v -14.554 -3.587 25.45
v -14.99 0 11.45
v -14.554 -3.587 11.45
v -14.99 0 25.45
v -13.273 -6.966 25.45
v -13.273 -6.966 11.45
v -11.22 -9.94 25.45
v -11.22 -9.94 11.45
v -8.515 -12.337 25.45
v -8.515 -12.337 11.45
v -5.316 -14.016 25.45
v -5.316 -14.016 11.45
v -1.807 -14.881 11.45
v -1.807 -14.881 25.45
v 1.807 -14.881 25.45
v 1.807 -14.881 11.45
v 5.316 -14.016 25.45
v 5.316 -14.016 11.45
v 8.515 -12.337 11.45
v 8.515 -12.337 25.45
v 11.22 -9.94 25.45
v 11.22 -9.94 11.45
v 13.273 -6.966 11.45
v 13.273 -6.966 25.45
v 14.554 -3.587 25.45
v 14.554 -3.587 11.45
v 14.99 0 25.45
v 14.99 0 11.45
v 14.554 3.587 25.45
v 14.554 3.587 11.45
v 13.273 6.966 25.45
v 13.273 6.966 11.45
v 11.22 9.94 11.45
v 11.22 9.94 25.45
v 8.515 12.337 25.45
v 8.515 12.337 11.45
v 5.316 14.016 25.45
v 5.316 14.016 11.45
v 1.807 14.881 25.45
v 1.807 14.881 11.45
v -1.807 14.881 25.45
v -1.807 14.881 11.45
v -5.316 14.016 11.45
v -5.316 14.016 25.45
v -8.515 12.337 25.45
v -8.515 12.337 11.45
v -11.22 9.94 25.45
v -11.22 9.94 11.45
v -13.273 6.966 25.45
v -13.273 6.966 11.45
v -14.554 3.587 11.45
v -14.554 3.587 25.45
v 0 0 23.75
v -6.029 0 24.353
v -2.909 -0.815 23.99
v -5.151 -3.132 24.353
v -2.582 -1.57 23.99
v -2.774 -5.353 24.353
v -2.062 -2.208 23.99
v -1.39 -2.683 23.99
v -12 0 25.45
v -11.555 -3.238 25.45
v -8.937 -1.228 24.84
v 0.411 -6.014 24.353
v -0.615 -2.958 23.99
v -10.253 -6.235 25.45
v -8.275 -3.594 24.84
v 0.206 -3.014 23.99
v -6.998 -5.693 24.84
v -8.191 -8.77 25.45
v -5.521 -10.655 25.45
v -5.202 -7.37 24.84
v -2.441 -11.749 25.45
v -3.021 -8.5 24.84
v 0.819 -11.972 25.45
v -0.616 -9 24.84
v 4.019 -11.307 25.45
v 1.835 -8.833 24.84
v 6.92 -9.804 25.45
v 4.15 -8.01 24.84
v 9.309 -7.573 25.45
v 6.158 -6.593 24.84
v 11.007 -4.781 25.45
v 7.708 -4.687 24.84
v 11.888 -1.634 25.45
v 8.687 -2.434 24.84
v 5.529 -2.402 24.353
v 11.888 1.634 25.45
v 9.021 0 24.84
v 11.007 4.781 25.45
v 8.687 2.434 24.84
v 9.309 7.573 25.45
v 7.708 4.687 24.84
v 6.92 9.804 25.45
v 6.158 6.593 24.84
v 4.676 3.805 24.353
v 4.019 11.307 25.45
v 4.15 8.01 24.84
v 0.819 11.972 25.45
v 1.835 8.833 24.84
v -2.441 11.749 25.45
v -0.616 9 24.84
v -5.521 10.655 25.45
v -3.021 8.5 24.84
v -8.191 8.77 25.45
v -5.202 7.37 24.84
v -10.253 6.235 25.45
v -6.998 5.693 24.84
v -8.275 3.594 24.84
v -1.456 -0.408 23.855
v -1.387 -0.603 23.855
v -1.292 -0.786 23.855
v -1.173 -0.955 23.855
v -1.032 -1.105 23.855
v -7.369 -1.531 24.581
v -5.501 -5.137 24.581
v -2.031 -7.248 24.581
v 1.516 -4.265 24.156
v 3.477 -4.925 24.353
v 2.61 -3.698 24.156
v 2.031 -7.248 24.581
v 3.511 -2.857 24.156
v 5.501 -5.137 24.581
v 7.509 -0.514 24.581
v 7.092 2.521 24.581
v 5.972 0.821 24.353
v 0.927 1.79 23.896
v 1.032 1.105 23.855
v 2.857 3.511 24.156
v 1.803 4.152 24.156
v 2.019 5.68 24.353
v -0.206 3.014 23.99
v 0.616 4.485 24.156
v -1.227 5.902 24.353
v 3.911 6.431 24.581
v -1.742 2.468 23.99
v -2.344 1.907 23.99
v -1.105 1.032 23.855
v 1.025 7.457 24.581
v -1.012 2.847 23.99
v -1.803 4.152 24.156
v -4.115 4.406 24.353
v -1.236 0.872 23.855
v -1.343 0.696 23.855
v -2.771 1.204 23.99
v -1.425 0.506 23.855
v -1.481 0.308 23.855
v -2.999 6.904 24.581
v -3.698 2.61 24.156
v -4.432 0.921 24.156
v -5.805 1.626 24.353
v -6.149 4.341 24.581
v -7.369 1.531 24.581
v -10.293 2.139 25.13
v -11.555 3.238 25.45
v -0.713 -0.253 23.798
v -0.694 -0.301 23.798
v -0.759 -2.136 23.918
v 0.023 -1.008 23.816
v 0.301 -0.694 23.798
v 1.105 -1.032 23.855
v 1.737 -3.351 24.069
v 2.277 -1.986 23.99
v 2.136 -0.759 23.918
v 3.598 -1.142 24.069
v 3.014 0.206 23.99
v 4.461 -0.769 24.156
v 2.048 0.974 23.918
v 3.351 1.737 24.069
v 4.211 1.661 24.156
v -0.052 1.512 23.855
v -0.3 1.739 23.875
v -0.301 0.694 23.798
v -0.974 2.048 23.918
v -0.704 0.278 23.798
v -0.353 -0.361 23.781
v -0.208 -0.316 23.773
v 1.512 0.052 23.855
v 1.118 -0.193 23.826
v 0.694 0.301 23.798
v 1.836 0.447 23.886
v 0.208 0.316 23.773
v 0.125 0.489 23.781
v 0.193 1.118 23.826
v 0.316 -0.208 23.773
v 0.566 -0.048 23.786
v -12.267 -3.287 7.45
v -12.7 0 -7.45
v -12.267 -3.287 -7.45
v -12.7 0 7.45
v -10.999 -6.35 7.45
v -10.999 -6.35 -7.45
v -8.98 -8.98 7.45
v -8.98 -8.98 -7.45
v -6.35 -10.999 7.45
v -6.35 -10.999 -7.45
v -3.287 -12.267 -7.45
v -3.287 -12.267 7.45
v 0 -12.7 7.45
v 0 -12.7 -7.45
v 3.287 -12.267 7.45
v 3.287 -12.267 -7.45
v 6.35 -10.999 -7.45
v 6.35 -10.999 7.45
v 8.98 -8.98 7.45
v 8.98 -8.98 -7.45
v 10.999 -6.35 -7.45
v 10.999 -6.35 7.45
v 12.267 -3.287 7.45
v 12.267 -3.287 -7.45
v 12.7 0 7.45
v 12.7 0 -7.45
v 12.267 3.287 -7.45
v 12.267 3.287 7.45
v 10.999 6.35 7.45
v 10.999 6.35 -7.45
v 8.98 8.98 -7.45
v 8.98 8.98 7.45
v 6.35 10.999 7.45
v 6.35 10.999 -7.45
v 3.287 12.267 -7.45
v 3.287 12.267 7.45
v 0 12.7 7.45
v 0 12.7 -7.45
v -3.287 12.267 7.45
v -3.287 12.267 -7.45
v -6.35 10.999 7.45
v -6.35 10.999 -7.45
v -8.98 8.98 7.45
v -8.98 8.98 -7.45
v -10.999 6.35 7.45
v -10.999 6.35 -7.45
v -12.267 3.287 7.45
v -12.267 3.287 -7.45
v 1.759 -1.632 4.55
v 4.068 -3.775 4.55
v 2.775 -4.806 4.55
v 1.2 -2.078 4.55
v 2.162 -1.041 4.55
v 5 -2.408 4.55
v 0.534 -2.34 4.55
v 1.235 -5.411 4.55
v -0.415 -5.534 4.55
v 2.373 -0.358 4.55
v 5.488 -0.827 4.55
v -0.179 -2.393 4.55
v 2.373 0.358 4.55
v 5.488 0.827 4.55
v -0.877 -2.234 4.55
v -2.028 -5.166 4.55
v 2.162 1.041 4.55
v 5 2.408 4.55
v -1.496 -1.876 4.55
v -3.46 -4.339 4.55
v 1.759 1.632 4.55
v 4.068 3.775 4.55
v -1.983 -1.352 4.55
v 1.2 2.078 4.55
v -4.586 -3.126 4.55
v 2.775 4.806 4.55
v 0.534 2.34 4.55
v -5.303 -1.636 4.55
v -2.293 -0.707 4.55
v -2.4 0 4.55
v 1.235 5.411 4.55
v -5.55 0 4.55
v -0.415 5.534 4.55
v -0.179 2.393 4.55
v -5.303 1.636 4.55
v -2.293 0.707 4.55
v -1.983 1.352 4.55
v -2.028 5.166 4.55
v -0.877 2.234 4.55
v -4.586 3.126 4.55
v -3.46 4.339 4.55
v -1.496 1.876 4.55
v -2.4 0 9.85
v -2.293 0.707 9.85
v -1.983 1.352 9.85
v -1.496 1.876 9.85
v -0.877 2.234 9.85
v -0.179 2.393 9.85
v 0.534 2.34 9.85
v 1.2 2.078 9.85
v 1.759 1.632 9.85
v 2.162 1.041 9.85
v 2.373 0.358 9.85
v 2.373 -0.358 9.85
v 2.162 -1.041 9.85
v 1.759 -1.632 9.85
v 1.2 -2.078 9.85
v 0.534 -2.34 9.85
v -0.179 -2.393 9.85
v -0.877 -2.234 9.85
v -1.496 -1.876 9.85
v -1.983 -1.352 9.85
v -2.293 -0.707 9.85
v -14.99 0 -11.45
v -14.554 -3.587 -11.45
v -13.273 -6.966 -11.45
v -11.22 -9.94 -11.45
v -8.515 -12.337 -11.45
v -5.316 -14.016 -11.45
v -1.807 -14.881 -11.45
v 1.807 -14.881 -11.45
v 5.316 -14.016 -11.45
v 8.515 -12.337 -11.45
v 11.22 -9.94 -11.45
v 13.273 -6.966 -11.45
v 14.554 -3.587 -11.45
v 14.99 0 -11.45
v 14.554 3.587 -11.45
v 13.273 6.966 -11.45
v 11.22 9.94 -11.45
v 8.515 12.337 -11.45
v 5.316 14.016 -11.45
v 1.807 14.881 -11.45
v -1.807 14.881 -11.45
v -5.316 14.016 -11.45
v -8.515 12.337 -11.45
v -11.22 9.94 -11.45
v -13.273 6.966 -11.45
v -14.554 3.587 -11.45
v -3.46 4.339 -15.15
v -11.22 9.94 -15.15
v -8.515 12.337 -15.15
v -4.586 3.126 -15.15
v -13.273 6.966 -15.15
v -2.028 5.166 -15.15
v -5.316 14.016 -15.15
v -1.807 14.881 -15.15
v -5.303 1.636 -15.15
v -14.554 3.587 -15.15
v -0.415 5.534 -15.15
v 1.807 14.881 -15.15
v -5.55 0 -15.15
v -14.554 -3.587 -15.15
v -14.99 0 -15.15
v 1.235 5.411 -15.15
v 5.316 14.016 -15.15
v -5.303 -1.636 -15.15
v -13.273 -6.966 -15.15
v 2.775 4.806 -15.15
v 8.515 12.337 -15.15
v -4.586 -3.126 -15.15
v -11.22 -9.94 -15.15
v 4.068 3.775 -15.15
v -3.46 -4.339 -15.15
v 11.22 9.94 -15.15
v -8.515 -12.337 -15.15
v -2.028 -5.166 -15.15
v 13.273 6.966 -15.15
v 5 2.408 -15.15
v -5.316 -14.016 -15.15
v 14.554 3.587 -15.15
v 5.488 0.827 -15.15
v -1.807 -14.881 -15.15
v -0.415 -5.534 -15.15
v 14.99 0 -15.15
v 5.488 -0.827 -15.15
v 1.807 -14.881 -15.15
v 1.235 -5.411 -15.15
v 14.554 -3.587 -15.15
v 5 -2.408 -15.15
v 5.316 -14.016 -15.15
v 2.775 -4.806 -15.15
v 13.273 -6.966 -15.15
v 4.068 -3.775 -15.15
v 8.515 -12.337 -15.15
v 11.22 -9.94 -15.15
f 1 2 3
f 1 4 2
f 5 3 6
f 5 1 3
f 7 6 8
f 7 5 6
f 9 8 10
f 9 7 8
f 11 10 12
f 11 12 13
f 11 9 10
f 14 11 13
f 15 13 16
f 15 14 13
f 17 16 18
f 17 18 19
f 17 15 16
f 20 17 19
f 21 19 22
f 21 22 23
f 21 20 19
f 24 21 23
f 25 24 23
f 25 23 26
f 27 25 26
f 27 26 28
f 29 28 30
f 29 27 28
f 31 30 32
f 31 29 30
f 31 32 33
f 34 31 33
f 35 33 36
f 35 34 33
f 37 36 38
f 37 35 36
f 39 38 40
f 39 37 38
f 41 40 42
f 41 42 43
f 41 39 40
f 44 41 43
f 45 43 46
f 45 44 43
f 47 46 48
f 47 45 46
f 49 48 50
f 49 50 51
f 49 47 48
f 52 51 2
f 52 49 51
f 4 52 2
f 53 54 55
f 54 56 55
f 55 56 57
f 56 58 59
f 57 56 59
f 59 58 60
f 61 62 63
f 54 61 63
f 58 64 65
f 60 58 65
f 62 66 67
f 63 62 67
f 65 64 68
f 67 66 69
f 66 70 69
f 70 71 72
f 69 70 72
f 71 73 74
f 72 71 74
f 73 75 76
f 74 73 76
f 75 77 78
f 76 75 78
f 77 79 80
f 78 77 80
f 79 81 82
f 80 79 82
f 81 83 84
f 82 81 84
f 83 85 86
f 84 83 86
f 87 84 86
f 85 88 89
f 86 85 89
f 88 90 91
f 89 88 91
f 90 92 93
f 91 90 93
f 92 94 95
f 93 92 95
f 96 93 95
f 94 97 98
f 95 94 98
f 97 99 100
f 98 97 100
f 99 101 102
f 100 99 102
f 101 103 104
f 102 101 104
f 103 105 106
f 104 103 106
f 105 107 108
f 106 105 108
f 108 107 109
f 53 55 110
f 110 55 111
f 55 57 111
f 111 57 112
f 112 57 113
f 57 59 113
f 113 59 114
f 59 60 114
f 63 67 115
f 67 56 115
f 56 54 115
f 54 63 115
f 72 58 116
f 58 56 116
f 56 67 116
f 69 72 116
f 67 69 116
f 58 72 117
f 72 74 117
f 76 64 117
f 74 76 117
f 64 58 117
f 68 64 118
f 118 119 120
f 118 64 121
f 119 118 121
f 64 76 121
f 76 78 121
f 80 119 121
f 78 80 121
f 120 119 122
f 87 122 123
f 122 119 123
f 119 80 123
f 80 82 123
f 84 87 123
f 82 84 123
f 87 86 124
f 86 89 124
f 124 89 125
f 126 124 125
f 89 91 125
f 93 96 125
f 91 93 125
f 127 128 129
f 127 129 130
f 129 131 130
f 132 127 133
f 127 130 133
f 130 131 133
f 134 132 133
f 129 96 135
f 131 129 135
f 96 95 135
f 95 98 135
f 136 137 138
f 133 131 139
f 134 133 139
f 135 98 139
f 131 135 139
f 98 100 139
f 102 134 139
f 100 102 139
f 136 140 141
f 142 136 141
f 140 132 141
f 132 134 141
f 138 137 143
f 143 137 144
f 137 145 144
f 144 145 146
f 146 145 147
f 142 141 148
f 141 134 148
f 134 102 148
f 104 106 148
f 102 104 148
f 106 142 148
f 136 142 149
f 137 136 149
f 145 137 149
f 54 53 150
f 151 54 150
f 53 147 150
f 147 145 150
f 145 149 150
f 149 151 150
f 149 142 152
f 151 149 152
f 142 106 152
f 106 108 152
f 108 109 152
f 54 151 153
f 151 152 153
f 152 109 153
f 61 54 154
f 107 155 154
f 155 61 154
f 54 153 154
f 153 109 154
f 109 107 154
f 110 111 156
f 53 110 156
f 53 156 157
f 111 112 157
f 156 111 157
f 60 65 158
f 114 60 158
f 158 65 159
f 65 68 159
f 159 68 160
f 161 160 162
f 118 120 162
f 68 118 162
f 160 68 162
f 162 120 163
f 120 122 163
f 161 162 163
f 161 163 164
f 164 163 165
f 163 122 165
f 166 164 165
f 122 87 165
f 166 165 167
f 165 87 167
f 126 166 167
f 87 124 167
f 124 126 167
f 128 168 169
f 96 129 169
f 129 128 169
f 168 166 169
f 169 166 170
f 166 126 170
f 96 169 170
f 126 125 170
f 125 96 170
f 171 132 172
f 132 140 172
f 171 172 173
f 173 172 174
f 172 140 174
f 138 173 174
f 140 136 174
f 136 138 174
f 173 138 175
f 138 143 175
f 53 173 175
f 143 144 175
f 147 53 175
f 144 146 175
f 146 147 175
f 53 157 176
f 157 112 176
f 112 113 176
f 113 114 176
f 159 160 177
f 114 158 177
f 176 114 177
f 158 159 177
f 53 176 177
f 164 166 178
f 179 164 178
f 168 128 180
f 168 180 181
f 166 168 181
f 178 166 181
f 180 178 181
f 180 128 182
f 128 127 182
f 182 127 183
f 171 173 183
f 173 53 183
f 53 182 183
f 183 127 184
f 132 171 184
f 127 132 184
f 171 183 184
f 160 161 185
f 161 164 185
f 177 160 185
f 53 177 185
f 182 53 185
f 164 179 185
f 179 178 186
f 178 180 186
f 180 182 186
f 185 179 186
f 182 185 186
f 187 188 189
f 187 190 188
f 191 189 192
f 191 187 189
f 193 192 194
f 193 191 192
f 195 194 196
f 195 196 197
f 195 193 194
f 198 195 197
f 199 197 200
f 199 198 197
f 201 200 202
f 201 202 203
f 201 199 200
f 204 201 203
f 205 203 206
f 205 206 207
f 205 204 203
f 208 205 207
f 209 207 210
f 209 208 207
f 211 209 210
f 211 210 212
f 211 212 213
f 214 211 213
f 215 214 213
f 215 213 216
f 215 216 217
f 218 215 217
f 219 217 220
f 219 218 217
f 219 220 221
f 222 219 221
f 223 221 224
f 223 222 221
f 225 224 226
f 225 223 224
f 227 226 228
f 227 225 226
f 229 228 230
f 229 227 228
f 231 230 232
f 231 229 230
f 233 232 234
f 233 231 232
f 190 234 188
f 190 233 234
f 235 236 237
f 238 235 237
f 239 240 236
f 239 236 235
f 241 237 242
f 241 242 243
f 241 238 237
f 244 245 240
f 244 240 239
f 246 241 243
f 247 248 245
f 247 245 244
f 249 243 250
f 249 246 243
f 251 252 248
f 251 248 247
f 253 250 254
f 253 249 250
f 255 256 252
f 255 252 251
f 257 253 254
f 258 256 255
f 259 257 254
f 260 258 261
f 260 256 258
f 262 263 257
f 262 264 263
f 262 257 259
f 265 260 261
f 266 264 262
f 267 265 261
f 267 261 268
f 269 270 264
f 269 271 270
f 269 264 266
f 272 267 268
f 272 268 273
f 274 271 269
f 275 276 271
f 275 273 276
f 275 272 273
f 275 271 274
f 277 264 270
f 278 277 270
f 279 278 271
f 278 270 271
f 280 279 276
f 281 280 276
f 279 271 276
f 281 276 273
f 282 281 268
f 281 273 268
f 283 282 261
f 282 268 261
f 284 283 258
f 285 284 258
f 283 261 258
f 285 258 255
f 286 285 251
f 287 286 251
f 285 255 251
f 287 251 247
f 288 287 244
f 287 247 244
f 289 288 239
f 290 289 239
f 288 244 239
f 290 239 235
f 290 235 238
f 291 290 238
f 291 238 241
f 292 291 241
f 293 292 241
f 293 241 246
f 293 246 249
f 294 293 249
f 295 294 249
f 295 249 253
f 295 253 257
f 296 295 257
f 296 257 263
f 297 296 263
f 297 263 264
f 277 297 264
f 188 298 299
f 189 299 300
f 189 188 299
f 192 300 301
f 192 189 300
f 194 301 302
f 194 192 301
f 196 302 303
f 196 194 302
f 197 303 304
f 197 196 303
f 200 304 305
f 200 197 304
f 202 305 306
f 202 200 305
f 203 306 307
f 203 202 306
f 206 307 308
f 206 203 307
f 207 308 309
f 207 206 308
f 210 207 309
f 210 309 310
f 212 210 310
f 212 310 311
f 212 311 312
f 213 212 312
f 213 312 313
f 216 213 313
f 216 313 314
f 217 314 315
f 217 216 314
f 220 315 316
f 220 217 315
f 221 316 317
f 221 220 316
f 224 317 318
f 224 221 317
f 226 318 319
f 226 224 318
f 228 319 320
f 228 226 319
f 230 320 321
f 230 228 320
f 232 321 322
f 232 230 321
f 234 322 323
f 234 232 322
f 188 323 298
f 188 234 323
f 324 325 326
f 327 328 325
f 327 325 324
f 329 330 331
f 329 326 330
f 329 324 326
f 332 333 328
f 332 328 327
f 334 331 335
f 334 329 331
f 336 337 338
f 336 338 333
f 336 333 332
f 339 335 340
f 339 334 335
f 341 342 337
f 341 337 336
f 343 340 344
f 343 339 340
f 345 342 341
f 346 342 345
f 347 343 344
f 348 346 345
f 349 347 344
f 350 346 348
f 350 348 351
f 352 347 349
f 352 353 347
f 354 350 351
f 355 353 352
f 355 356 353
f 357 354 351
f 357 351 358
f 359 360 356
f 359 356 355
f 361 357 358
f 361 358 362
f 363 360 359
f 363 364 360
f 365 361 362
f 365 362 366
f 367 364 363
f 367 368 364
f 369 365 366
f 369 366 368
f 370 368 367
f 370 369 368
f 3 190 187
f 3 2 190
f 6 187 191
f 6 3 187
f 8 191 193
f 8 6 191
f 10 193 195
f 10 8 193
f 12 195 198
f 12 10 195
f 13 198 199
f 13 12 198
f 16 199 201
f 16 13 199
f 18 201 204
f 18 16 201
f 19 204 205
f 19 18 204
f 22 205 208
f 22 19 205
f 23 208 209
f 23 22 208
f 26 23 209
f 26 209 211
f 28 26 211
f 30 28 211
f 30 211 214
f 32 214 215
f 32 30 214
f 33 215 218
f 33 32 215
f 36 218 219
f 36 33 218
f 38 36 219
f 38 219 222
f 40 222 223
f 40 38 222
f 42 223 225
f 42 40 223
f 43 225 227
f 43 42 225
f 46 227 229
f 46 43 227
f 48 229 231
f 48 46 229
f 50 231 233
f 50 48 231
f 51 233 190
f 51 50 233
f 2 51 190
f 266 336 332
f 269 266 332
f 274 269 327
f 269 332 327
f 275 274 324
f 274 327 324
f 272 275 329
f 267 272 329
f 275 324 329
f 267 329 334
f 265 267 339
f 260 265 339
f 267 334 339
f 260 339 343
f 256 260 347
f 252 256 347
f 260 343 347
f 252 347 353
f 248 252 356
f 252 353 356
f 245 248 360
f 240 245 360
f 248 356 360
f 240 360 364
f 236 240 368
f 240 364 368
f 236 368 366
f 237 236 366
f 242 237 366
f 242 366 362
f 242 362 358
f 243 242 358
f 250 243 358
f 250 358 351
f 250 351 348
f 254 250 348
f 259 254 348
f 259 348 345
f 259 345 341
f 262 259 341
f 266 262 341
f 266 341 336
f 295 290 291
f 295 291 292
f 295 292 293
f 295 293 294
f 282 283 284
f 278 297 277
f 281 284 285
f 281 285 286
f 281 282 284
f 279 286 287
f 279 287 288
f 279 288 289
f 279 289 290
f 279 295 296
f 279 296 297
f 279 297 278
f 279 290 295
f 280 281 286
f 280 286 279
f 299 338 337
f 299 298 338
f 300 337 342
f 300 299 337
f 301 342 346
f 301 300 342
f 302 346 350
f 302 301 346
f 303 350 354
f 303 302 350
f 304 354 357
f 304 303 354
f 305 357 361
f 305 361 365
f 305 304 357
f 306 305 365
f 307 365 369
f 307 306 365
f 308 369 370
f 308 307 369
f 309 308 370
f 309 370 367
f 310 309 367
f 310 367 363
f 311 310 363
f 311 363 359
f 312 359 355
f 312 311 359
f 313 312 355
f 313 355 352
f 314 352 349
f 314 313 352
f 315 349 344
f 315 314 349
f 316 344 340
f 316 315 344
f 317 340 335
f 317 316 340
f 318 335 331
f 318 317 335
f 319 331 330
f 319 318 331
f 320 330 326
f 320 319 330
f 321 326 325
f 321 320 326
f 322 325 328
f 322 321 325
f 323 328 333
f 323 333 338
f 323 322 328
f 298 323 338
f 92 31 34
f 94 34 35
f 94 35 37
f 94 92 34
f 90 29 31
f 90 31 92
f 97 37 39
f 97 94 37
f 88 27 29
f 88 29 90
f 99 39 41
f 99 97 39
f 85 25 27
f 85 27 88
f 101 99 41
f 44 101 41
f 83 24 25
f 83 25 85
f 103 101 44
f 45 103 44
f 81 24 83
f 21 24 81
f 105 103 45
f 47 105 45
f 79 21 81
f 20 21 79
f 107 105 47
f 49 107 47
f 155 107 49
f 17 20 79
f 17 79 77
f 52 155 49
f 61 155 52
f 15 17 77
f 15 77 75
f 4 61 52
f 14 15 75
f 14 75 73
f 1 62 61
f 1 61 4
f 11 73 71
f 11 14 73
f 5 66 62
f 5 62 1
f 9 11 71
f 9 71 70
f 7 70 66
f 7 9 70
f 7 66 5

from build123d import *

# Parameters (mm, degrees)
SKETCH3_R          = 5.55
CUT_EXTRUDE1_DEPTH = 20
SKETCH4_R          = 2.4
CUT_EXTRUDE2_DEPTH = 25


with BuildPart() as part:
    # Sketch2 → Revolve1 (revolve)
    with BuildSketch(Plane(origin=(0, 0, 0), x_dir=(1, 0, 0), z_dir=(0, 1, 0)), mode=Mode.PRIVATE) as revolve1_sk:
        with BuildLine():
            Line((0, 15.45), (2, 15.45))
            Line((2, 15.45), (2, 15.15))
            Line((2, 15.15), (14.99, 15.15))
            Line((14.99, 15.15), (14.99, 11.45))
            Line((14.99, 11.45), (12.7, 7.45))
            Line((12.7, 7.45), (12.7, -7.45))
            Line((12.7, -7.45), (14.99, -11.45))
            Line((14.99, -11.45), (14.99, -15.15))
            Line((14.99, -15.15), (14.99, -25.45))
            Line((14.99, -25.45), (12, -25.45))
            add(Edge.make_bspline(
                [(0, -23.75), (6.057028237, -24.106745249), (12, -25.45)],
                knots=[0, 0, 0, 1, 1, 1], degree=2))
            Line((0, -23.75), (0, 0))
            Line((0, 0), (0, 15.45))
        make_face()
    revolve(revolve1_sk.sketch.rotate(Axis((0, 0, -30.524751378), (0, 0, 1)), 180), axis=Axis((0, 0, -30.524751378), (0, 0, 1)))

    # Sketch3 → Cut-Extrude1 (cut)
    with BuildSketch(Plane(origin=(0, 0, -15.45), x_dir=(-1, 0, 0), z_dir=(0, 0, -1))):
        Circle(SKETCH3_R)
    extrude(amount=-CUT_EXTRUDE1_DEPTH, mode=Mode.SUBTRACT)

    # Sketch4 → Cut-Extrude2 (cut)
    with BuildSketch(Plane(origin=(0, 0, -15.15), x_dir=(-1, 0, 0), z_dir=(0, 0, -1))):
        Circle(SKETCH4_R)
    extrude(amount=-CUT_EXTRUDE2_DEPTH, mode=Mode.SUBTRACT)


solid = part.part
